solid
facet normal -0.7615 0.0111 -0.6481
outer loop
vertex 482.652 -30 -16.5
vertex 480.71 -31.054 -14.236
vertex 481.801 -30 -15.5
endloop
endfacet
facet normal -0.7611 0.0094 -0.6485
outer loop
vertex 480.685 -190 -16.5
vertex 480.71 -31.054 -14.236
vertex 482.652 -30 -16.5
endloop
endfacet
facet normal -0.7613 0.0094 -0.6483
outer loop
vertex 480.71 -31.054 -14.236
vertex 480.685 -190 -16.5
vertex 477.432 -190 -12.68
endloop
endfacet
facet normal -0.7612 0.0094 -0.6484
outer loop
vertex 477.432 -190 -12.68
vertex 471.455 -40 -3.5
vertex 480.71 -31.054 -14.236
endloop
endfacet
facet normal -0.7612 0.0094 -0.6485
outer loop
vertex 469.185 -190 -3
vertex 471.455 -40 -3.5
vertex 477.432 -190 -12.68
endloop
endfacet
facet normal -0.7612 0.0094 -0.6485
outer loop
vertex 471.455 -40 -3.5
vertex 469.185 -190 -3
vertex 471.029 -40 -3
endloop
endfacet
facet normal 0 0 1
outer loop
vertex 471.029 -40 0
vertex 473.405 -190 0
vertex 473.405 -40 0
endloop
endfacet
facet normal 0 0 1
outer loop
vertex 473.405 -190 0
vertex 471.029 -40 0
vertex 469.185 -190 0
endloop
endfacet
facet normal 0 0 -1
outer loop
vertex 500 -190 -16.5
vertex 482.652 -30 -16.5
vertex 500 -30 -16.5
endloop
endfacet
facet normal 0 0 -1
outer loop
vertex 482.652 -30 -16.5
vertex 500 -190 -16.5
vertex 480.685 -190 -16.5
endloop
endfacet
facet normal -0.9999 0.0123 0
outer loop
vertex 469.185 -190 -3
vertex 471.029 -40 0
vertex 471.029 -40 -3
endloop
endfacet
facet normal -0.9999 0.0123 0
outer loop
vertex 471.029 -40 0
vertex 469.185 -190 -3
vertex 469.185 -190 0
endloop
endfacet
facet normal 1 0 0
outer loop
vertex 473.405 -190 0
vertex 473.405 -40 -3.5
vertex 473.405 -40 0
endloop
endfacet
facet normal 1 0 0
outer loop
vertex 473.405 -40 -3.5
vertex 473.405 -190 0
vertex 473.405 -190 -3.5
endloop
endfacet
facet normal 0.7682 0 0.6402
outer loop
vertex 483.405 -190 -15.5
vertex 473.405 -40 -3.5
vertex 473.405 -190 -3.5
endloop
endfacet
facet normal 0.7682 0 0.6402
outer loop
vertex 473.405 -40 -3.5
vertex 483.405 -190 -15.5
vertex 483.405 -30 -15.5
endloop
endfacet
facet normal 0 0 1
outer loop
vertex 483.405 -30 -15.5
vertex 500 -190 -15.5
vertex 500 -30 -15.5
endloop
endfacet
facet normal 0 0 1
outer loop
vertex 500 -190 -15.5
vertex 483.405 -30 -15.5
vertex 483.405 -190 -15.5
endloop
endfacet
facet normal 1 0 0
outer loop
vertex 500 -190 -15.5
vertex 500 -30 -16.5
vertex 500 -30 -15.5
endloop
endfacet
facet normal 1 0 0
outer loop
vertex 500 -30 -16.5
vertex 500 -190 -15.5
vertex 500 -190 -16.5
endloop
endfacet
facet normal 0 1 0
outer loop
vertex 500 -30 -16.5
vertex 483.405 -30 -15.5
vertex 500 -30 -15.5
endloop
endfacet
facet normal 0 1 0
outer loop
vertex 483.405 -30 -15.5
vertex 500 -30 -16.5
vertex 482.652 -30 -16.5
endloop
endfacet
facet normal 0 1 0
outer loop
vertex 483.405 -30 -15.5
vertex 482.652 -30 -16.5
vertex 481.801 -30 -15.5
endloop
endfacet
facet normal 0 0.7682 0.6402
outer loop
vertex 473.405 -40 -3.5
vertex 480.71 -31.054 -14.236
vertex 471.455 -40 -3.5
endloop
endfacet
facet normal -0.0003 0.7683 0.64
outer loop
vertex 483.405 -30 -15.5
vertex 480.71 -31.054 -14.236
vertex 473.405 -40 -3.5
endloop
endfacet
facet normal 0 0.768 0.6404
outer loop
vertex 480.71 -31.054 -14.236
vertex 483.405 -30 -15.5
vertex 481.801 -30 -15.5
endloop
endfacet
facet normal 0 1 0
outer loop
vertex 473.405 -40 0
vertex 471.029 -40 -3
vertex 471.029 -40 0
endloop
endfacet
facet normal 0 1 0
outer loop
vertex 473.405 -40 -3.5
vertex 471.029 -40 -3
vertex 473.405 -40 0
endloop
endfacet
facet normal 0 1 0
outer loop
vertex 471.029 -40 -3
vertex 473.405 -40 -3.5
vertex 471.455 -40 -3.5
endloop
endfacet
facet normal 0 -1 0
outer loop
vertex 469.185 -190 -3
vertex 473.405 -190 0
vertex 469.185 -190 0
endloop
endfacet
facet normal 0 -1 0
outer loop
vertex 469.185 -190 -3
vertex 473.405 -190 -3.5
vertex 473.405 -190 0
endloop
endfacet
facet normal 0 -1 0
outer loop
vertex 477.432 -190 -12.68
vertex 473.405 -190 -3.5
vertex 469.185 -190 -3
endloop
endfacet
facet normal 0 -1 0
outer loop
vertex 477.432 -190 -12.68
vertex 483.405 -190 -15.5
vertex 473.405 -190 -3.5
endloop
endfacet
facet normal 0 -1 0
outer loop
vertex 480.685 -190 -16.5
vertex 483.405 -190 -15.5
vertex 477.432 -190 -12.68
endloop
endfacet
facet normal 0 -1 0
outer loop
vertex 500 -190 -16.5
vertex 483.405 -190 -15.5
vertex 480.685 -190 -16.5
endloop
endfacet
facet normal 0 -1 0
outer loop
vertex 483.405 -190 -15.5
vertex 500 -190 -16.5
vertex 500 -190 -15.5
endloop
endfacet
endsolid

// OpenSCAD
largeur_porte = 920;
hauteur_decalage = 21.65-10.34;
hauteur_biseau = 10;
largeur_biseau = 12;
largeur_biseau_bas = 3;
hauteur_renfort = 23+hauteur_decalage;
epaisseur = 1.5;
longueur_max = 190;


module biseau(longueur, largeur, largeur_bas, hauteur){
	translate([0,0,-(hauteur+hauteur_renfort)])
	rotate([90,0,0])
	linear_extrude(height=longueur, center=true, convexity = 10, twist = 0) 
			polygon(points=[
				[0,0],
				[0,hauteur+hauteur_renfort],
				[largeur+largeur_bas,hauteur+hauteur_renfort],
				[largeur+largeur_bas,hauteur],
				[largeur_bas,0]
				], paths=[[0,1,2,3,4]]);
}

module moule_porte(){
	rotate([0, 90, 0])
	difference(){
		cube([2*largeur_porte, 2*largeur_porte, 190], center = true);
		cube([largeur_porte, largeur_porte, 200], center = true);
	}
}

module biseau2(){
	angle = atan(hauteur_decalage/largeur_porte);
	decallage=hauteur_decalage/2+epaisseur/2;
	difference(){
		rotate([angle, 0, 0]) biseau(1.5*largeur_porte, largeur_biseau+epaisseur, largeur_biseau_bas, hauteur_biseau+epaisseur);
		translate([-0.5, 0, decallage]) biseau(largeur_porte, largeur_biseau, largeur_biseau_bas+1, hauteur_biseau);
	}
}

module barre_complete(){
	rotate([0,90,0])
	translate([0,largeur_porte/2,0]) 
	difference(){
		translate([0, 0, hauteur_decalage]) biseau2();
		translate([-0.5,-(largeur_porte/2+hauteur_renfort),0]) rotate([90, 0, 0]) biseau(200, largeur_biseau, largeur_biseau_bas+1, hauteur_biseau);
		translate([-0.5,largeur_porte/2+hauteur_renfort,0]) rotate([-90, 0, 0]) biseau(200, largeur_biseau, largeur_biseau_bas+1, hauteur_biseau);
		translate([0, 0, -largeur_porte/2]) moule_porte();
	}
}


module partie1(){
	difference(){
	translate([0,-longueur_max,0]) barre_complete();
	translate([0,largeur_porte/2,0])cube([largeur_porte,largeur_porte,largeur_porte], center=true);
	translate([0,-largeur_porte/2-longueur_max,0])cube([largeur_porte,largeur_porte,largeur_porte], center=true);
	}
}

module partie2(){
	difference(){
	translate([0,-2*longueur_max,0]) barre_complete();
	translate([0,largeur_porte/2,0])cube([largeur_porte,largeur_porte,largeur_porte], center=true);
	translate([0,-largeur_porte/2-longueur_max,0])cube([largeur_porte,largeur_porte,largeur_porte], center=true);
	}
}

module partie3(){
	difference(){
	translate([0,-3*longueur_max,0]) barre_complete();
	translate([0,largeur_porte/2,0])cube([largeur_porte,largeur_porte,largeur_porte], center=true);
	translate([0,-largeur_porte/2-longueur_max,0])cube([largeur_porte,largeur_porte,largeur_porte], center=true);
	}
}

module partie4(){
	difference(){
	translate([0,-3*longueur_max,0]) barre_complete();
	translate([0,largeur_porte/2,0])cube([largeur_porte,largeur_porte,largeur_porte], center=true);
	translate([0,-largeur_porte/2-longueur_max,0])cube([largeur_porte,largeur_porte,largeur_porte], center=true);
	}
}

module partie5(){
	difference(){
	translate([0,-4*longueur_max,0]) barre_complete();
	translate([0,largeur_porte/2,0])cube([largeur_porte,largeur_porte,largeur_porte], center=true);
	translate([0,-largeur_porte/2-longueur_max,0])cube([largeur_porte,largeur_porte,largeur_porte], center=true);
	}
}

module partie6(){
	difference(){
	translate([0,-5*longueur_max,0]) barre_complete();
	translate([0,largeur_porte/2,0])cube([largeur_porte,largeur_porte,largeur_porte], center=true);
	translate([0,-largeur_porte/2-longueur_max,0])cube([largeur_porte,largeur_porte,largeur_porte], center=true);
	}
}

//barre_complete();
//partie1();
//translate([100,0,0]) partie2();
//translate([200,0,0]) partie3();
//translate([300,0,0]) partie4();
//translate([400,0,0]) partie5();
translate([500,0,0]) partie6();
